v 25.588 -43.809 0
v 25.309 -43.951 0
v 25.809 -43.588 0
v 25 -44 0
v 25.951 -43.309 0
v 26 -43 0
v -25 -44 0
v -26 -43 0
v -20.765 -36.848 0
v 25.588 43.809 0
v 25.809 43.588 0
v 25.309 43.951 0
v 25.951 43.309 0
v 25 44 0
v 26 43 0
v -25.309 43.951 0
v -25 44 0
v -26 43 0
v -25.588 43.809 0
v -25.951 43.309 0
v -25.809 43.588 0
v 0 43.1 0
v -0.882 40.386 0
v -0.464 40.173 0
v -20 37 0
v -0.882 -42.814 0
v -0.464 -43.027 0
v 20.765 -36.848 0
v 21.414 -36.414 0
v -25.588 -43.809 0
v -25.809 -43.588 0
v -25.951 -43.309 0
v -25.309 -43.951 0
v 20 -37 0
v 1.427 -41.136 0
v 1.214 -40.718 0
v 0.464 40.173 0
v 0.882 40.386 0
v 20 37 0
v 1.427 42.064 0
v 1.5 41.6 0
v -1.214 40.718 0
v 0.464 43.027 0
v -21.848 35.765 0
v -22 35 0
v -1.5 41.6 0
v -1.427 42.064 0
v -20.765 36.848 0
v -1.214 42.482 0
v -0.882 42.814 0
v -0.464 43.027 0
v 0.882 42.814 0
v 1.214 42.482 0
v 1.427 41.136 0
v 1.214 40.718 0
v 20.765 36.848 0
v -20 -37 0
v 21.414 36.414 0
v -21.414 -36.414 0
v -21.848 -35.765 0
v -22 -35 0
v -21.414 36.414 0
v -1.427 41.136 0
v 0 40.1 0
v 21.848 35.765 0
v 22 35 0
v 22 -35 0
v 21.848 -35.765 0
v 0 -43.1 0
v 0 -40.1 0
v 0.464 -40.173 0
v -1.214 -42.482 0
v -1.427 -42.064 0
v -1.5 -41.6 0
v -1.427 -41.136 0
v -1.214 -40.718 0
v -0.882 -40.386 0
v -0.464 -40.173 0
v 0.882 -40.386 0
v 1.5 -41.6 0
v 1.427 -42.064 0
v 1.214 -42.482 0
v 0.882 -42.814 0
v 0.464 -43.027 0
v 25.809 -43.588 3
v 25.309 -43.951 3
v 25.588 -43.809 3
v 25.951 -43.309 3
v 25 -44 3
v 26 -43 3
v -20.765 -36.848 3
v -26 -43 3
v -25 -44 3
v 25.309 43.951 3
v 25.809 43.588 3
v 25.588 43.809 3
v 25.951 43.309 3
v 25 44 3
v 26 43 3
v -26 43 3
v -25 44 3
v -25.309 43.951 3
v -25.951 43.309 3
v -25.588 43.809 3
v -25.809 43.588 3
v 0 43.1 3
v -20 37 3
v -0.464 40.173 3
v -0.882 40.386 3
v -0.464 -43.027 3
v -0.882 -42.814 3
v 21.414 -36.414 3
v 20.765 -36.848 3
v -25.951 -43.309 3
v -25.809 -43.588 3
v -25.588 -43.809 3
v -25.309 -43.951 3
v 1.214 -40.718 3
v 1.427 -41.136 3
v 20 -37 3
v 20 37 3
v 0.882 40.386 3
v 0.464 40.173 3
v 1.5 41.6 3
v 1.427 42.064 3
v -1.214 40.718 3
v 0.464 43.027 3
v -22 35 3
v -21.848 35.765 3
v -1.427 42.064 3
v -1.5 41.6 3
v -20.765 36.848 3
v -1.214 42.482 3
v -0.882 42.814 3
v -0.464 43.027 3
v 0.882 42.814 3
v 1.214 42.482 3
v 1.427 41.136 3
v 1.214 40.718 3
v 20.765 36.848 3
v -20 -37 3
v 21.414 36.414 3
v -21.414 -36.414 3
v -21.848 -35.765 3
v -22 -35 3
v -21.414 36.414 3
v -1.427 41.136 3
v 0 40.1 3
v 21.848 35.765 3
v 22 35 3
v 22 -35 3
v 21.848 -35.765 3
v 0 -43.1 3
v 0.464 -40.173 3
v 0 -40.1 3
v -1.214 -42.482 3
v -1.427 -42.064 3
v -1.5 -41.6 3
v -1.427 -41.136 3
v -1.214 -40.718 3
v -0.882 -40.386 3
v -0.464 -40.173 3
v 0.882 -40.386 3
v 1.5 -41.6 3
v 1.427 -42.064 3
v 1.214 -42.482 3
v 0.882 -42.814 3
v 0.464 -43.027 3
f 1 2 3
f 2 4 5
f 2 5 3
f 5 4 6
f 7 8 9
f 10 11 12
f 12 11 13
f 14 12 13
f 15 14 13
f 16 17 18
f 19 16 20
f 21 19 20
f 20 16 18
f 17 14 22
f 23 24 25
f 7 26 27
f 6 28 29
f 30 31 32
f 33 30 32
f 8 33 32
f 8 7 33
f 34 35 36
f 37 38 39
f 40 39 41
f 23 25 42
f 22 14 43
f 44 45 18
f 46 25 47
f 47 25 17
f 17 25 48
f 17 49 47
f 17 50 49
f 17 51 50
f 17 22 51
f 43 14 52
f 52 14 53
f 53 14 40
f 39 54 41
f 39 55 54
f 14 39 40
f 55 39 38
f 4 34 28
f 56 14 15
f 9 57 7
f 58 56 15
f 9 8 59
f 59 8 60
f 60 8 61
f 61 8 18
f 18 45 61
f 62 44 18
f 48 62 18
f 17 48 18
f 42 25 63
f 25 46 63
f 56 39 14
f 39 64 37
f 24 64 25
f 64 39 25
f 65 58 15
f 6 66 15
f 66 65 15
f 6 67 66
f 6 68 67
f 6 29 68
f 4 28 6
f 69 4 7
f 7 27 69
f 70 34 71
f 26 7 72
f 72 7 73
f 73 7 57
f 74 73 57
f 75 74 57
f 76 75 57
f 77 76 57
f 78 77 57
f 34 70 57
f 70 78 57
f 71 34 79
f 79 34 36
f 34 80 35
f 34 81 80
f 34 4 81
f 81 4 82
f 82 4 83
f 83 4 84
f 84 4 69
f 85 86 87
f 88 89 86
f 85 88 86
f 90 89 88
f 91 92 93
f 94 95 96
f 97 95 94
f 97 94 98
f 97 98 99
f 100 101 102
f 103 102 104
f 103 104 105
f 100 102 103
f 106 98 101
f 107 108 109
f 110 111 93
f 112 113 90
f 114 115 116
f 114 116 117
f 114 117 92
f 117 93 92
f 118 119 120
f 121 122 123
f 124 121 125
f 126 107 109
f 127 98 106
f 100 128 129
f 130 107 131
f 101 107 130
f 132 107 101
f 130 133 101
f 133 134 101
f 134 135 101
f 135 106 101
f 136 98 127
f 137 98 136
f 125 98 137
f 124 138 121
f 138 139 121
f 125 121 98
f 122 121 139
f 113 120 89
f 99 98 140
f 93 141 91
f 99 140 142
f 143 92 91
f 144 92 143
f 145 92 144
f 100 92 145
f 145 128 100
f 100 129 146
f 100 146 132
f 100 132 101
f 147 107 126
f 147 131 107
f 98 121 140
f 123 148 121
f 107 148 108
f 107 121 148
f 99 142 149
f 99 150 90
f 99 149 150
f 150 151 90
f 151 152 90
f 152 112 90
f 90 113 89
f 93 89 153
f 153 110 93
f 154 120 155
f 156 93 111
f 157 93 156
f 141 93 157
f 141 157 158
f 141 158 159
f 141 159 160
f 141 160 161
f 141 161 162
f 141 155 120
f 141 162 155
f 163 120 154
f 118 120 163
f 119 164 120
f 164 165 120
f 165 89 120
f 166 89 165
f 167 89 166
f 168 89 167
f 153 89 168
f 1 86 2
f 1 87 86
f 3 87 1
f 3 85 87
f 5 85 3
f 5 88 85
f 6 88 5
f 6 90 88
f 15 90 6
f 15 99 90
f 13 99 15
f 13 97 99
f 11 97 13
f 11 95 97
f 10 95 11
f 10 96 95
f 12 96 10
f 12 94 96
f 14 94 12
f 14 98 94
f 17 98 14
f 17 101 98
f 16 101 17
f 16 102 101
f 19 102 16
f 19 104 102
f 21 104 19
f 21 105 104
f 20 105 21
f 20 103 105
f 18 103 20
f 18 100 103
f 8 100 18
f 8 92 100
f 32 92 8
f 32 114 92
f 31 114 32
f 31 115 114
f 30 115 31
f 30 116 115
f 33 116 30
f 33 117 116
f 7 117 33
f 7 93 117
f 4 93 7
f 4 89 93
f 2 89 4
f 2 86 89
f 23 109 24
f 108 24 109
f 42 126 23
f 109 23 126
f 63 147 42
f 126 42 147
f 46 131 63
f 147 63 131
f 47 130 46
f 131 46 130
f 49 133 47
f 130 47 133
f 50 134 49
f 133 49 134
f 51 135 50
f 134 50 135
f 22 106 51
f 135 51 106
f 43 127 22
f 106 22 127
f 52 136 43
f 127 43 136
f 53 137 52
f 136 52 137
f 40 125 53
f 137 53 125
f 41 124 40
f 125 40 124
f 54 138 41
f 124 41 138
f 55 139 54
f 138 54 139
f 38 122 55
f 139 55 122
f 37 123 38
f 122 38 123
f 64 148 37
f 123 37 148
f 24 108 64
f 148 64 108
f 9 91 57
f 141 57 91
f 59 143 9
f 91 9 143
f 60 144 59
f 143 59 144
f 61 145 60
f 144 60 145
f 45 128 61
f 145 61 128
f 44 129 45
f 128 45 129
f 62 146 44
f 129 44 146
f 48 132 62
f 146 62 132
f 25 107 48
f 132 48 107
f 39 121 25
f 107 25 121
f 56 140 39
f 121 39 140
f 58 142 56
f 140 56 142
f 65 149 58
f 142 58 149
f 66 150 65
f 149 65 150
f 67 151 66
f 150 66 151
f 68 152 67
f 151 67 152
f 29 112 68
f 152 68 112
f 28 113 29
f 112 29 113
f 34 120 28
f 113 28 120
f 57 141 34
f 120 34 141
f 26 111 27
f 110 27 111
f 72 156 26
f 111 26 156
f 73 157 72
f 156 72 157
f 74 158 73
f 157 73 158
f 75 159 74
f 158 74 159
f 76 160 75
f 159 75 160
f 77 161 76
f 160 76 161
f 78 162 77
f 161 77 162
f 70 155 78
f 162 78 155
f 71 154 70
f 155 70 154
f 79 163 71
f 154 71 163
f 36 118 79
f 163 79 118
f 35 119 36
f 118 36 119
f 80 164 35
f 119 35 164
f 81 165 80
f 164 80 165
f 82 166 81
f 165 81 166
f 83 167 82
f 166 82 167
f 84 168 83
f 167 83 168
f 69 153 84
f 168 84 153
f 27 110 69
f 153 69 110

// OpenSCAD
*
  difference(){
    translate([-5,-4]) cube([10,8,6]);
    translate([0,0,-.01]) cylinder(d=4,h=6.02,$fn=20);
}
linear_extrude(3)
difference(){
  translate([-25,-43]) minkowski(){
    square([50,86]);
    circle(d=2,$fn=20);
  }
  minkowski(){
    square([40,70],center=true);
    circle(r=2,$fn=16);
  }
  for(x=[0],y=[41.6,-41.6])
    translate([x,y]) circle(d=3,$fn=20);
  for(x=[-16,-11,6,11],y=[-52.5,52.5])
    translate([x,y]) circle(d=4,$fn=20);
}
